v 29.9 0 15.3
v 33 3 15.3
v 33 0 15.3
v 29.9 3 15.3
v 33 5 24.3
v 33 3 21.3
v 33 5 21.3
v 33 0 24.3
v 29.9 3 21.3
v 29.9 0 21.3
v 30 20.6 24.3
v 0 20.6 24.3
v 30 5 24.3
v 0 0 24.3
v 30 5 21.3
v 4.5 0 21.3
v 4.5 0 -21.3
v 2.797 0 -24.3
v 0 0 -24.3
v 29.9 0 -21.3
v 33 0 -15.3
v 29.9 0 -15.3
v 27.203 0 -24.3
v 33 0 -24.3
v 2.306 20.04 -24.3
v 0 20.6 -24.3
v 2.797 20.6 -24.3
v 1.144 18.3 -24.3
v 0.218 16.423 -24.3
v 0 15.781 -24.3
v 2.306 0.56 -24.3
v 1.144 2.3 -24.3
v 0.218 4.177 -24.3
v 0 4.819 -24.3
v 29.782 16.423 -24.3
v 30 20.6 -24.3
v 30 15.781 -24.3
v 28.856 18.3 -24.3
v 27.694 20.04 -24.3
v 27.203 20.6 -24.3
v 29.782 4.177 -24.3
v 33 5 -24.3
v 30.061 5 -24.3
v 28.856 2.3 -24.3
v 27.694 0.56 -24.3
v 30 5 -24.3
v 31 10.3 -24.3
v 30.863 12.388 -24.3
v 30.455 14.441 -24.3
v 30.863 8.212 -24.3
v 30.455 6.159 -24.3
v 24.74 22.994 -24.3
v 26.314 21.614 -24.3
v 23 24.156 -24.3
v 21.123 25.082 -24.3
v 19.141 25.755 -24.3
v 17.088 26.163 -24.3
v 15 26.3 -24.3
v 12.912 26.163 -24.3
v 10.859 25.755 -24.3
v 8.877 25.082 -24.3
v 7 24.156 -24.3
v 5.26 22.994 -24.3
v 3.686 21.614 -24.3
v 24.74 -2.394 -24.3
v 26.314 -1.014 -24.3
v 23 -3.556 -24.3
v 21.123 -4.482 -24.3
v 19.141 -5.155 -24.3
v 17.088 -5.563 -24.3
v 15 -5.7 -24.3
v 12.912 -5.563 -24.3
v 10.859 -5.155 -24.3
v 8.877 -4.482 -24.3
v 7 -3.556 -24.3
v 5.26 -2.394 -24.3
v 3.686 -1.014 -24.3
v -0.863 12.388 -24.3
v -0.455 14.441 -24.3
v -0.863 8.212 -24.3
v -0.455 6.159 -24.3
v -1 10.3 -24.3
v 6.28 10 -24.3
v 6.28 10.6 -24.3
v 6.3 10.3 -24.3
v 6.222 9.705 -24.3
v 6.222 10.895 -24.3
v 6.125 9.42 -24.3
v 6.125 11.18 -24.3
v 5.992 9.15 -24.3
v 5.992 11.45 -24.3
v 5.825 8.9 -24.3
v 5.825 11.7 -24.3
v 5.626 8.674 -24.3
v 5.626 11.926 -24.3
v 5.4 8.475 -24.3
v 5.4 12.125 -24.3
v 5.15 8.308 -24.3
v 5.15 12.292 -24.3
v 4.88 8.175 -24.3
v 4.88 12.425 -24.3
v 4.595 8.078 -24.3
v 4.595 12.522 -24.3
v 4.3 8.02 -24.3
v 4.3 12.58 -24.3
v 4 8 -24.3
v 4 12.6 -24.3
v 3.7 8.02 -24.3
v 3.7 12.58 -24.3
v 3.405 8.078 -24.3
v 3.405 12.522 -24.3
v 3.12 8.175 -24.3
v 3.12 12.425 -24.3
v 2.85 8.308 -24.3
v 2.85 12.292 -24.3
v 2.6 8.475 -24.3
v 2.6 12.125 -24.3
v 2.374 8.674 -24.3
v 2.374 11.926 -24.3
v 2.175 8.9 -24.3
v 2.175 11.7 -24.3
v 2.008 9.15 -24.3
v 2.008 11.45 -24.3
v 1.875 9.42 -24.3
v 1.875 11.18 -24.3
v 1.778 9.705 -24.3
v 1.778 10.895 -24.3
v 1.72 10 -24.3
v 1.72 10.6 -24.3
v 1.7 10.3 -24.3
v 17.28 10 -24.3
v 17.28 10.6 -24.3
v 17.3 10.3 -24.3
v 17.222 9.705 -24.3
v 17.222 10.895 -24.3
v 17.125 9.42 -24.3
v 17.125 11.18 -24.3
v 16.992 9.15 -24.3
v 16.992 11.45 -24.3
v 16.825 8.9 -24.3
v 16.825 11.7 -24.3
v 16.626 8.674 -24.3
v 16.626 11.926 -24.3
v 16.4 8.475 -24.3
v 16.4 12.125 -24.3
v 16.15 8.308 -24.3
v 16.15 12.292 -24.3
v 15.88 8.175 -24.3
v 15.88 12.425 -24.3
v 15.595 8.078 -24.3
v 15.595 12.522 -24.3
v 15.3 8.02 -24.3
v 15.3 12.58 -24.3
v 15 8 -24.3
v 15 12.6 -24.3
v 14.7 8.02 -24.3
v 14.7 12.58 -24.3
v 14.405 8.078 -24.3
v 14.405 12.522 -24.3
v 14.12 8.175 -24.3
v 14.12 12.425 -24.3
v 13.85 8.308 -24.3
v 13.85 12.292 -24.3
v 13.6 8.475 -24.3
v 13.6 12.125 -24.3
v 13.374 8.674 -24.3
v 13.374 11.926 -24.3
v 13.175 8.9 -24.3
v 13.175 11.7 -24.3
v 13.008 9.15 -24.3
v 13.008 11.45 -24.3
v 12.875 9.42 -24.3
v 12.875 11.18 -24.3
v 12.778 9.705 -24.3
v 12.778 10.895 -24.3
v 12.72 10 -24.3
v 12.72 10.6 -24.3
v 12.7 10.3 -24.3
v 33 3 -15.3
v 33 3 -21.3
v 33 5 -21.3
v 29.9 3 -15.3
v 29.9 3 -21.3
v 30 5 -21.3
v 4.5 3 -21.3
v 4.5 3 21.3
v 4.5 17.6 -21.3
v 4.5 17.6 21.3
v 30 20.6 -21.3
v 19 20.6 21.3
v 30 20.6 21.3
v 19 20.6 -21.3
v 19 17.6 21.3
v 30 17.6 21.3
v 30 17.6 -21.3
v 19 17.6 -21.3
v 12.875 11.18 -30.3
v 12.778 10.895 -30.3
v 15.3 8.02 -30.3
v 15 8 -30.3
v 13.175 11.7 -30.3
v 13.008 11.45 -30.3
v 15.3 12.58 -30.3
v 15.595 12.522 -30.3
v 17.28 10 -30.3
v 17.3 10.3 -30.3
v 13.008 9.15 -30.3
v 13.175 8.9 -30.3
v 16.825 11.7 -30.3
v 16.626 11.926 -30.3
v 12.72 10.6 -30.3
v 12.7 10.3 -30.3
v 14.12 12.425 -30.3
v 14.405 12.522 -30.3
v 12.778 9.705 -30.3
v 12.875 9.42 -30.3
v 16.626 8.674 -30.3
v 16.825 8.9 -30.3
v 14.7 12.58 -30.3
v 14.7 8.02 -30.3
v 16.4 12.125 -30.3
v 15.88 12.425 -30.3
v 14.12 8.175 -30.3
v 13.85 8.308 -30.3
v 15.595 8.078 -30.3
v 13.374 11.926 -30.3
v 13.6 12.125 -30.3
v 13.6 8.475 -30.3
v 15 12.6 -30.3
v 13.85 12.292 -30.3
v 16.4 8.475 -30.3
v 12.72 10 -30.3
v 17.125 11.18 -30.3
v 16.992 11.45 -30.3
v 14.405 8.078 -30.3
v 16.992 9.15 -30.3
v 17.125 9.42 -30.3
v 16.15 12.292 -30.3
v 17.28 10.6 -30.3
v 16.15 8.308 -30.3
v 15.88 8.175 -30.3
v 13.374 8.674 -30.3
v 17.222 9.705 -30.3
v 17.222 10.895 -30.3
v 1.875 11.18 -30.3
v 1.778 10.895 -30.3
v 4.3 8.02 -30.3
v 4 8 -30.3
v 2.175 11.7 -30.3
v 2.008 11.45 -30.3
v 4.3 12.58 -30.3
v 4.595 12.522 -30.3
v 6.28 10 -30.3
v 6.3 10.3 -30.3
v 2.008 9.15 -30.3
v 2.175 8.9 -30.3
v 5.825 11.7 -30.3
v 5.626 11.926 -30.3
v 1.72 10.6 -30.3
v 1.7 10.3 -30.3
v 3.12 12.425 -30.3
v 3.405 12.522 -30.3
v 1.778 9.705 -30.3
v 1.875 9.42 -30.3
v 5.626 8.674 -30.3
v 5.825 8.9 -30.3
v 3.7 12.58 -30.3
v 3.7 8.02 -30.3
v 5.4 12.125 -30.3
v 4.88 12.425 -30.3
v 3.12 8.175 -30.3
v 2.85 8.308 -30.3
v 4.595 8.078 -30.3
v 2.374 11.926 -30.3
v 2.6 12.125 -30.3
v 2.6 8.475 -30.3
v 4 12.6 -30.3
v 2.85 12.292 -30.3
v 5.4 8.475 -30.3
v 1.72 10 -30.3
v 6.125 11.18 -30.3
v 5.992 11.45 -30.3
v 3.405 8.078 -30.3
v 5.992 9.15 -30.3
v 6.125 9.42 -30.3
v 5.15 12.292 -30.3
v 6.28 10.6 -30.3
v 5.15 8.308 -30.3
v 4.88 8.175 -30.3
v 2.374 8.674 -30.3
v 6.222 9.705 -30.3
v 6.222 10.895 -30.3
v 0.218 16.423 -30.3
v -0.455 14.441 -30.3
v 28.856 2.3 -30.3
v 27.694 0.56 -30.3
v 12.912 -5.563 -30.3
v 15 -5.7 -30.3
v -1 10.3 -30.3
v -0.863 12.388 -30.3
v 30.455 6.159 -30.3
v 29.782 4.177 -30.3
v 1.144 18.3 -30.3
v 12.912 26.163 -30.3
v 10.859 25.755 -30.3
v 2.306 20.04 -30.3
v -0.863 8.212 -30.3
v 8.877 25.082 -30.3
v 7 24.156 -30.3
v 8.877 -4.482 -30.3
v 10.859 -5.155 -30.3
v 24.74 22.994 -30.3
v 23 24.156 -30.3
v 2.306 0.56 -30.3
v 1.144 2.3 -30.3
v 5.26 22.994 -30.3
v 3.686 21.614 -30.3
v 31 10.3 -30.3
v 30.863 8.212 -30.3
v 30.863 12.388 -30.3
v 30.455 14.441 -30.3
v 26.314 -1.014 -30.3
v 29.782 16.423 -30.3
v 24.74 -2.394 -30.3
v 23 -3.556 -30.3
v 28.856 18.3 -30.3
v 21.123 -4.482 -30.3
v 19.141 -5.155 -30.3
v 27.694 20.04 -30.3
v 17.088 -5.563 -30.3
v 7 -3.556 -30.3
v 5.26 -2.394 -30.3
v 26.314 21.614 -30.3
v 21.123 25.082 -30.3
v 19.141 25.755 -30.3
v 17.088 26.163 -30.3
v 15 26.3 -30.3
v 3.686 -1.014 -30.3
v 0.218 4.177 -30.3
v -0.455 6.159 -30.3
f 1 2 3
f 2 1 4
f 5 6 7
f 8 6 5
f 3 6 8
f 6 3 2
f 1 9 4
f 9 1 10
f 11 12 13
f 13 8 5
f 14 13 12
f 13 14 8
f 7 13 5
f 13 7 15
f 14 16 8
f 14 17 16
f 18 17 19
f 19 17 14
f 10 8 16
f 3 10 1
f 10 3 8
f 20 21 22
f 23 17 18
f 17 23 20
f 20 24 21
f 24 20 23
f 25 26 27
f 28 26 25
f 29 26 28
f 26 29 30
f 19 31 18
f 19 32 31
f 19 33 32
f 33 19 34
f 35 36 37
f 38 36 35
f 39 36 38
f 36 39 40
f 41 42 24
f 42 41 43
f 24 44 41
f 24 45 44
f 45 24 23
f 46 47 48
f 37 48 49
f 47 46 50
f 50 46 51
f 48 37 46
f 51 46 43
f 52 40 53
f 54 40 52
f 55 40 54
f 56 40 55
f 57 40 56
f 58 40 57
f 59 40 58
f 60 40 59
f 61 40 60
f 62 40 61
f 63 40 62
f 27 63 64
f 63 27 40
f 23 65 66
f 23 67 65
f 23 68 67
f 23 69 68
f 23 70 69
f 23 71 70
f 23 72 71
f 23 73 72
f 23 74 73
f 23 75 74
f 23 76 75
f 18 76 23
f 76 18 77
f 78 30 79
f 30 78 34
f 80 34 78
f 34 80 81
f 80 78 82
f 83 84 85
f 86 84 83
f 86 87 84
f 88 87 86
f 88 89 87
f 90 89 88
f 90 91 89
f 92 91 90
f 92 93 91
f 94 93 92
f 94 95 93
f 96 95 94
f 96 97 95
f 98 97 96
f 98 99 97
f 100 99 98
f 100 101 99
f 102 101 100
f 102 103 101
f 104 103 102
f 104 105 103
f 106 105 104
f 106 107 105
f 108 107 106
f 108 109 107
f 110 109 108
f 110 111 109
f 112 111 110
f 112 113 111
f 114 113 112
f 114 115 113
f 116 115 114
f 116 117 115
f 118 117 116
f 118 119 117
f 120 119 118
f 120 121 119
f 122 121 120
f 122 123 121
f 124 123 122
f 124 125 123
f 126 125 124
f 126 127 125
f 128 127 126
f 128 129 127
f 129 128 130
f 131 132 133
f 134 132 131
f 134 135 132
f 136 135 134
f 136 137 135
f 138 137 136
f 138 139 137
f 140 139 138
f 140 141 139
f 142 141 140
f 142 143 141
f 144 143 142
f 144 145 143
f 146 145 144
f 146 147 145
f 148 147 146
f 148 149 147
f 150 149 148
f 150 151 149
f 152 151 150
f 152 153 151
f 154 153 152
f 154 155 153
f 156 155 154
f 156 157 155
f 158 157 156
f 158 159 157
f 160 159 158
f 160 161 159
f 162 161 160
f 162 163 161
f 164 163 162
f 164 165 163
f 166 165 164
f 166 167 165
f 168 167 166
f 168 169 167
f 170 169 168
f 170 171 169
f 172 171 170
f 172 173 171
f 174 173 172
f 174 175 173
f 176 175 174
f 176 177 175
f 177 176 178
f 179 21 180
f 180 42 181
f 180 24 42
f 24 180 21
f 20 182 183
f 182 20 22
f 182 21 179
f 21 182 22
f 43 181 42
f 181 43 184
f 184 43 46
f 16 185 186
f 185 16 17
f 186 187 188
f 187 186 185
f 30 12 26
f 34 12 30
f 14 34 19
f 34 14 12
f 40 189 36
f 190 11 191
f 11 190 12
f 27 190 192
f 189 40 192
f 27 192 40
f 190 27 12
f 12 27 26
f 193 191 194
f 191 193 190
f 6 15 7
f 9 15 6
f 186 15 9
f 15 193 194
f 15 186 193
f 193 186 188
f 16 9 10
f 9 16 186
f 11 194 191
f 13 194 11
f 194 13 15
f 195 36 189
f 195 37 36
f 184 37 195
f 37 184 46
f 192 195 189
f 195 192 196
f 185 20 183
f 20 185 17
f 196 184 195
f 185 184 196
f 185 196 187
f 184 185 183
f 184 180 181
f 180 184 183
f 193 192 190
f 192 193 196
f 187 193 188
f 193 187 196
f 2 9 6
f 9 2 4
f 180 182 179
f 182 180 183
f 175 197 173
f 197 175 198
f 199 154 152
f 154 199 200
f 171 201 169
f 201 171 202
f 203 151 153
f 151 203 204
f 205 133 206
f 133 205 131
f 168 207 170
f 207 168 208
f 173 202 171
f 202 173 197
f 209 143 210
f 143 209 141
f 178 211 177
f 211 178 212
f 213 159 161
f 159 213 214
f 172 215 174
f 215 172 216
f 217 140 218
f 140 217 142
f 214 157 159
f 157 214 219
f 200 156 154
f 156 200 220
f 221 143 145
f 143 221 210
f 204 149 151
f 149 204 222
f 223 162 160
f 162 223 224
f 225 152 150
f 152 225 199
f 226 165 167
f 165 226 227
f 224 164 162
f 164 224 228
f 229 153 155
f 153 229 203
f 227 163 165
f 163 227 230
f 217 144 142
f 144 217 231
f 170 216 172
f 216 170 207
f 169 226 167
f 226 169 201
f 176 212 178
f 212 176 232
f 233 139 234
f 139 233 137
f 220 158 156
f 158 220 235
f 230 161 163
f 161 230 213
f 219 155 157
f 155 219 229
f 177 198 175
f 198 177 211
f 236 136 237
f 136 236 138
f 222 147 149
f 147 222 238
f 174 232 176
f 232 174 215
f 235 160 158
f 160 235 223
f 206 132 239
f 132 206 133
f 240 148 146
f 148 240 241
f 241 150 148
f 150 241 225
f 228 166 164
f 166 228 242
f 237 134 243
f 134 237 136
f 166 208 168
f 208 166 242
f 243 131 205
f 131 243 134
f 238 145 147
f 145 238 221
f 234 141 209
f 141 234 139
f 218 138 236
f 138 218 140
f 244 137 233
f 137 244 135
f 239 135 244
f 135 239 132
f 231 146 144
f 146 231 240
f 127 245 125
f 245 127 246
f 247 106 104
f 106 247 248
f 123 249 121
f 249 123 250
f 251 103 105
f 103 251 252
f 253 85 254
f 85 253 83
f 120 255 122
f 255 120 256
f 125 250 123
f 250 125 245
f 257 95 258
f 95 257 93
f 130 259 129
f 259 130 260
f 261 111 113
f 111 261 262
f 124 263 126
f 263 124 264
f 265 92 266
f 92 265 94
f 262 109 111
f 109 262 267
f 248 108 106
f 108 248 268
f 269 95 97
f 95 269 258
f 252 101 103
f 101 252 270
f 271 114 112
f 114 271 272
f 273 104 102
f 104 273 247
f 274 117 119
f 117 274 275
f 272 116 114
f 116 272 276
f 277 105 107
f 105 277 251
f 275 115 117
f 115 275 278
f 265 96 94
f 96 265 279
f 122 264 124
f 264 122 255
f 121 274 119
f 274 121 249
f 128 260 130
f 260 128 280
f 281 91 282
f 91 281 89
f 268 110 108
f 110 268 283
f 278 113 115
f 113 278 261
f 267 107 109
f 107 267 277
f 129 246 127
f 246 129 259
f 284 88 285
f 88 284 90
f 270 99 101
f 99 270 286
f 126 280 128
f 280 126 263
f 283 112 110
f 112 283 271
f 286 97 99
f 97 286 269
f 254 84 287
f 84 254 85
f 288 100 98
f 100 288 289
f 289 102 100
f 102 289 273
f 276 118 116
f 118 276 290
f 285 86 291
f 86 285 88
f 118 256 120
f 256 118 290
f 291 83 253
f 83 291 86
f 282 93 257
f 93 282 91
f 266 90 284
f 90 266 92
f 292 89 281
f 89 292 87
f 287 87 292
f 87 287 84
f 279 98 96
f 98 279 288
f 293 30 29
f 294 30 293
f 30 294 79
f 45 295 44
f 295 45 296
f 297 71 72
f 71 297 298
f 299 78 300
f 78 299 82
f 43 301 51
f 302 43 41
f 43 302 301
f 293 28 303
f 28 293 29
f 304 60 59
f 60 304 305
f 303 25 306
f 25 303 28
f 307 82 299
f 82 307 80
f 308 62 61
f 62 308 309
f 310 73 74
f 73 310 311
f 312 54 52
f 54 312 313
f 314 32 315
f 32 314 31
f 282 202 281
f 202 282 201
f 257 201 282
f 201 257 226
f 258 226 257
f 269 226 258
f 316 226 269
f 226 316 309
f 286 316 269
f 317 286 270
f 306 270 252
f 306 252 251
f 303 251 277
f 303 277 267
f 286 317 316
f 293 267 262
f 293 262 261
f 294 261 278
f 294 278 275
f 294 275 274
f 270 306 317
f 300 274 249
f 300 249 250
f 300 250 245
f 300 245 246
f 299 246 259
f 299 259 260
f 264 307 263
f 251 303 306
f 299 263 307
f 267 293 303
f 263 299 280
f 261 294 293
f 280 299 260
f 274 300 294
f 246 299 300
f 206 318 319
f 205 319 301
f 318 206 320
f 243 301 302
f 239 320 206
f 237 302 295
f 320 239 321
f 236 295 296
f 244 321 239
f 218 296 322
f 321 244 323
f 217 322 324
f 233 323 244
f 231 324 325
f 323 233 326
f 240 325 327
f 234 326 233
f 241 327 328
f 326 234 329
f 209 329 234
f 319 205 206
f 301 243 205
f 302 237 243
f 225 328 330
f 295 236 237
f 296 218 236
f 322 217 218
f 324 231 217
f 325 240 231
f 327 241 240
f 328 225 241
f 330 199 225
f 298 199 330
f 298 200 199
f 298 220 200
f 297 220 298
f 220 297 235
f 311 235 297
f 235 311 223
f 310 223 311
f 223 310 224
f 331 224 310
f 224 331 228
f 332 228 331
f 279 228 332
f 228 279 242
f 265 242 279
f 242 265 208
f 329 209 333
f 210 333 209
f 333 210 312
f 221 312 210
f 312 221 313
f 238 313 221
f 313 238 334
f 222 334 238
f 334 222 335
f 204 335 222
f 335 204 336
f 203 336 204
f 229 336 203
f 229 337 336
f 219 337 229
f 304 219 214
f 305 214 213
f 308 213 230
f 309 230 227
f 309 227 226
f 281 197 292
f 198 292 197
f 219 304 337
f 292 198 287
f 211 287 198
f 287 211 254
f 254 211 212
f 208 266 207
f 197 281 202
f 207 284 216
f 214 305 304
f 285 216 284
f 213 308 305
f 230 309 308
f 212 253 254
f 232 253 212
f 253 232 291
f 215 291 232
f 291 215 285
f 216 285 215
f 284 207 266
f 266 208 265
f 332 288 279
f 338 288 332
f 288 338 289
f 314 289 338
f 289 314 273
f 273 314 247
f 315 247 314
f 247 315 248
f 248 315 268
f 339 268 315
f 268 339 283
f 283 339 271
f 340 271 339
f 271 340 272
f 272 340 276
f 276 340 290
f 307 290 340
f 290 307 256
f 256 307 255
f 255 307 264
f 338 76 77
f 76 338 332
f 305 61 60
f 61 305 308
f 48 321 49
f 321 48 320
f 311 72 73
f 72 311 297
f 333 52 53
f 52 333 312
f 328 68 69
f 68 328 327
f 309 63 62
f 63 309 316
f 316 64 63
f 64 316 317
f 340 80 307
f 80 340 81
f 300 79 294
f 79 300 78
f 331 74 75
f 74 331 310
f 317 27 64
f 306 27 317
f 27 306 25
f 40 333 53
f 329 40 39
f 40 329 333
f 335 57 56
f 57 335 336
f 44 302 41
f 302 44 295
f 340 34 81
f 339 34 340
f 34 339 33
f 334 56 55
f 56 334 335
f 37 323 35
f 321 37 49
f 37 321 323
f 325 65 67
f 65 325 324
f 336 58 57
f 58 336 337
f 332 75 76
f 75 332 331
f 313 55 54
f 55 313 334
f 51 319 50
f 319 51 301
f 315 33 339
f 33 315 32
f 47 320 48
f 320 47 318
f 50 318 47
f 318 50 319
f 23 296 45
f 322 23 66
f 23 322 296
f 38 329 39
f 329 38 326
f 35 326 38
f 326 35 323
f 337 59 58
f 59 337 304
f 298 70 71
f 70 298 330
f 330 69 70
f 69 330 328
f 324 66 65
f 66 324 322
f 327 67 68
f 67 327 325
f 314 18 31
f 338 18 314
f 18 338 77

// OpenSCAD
// mount_cradle — the cam cradle, its own part since v1.1.0.
//
// Tilt is chosen at ASSEMBLY, by which index hole in mount_top's arm the second
// M3 goes through: 30..55 deg from vertical in 5 deg steps. Not below 30 — the
// top plate's front corner clips the bottom of the camera's FOV there.
//
// PRINTED ON ITS SIDE, PAD DOWN. That is both the cheapest orientation (7.5%
// unsupported overhang against 16.2% standing up) and the right one: the pad is
// the joint's mating face, and printing it against the bed makes it flat.
include <thermal_cam_mount_common.scad>
rotate([0, 90, 0]) mount_cradle();
